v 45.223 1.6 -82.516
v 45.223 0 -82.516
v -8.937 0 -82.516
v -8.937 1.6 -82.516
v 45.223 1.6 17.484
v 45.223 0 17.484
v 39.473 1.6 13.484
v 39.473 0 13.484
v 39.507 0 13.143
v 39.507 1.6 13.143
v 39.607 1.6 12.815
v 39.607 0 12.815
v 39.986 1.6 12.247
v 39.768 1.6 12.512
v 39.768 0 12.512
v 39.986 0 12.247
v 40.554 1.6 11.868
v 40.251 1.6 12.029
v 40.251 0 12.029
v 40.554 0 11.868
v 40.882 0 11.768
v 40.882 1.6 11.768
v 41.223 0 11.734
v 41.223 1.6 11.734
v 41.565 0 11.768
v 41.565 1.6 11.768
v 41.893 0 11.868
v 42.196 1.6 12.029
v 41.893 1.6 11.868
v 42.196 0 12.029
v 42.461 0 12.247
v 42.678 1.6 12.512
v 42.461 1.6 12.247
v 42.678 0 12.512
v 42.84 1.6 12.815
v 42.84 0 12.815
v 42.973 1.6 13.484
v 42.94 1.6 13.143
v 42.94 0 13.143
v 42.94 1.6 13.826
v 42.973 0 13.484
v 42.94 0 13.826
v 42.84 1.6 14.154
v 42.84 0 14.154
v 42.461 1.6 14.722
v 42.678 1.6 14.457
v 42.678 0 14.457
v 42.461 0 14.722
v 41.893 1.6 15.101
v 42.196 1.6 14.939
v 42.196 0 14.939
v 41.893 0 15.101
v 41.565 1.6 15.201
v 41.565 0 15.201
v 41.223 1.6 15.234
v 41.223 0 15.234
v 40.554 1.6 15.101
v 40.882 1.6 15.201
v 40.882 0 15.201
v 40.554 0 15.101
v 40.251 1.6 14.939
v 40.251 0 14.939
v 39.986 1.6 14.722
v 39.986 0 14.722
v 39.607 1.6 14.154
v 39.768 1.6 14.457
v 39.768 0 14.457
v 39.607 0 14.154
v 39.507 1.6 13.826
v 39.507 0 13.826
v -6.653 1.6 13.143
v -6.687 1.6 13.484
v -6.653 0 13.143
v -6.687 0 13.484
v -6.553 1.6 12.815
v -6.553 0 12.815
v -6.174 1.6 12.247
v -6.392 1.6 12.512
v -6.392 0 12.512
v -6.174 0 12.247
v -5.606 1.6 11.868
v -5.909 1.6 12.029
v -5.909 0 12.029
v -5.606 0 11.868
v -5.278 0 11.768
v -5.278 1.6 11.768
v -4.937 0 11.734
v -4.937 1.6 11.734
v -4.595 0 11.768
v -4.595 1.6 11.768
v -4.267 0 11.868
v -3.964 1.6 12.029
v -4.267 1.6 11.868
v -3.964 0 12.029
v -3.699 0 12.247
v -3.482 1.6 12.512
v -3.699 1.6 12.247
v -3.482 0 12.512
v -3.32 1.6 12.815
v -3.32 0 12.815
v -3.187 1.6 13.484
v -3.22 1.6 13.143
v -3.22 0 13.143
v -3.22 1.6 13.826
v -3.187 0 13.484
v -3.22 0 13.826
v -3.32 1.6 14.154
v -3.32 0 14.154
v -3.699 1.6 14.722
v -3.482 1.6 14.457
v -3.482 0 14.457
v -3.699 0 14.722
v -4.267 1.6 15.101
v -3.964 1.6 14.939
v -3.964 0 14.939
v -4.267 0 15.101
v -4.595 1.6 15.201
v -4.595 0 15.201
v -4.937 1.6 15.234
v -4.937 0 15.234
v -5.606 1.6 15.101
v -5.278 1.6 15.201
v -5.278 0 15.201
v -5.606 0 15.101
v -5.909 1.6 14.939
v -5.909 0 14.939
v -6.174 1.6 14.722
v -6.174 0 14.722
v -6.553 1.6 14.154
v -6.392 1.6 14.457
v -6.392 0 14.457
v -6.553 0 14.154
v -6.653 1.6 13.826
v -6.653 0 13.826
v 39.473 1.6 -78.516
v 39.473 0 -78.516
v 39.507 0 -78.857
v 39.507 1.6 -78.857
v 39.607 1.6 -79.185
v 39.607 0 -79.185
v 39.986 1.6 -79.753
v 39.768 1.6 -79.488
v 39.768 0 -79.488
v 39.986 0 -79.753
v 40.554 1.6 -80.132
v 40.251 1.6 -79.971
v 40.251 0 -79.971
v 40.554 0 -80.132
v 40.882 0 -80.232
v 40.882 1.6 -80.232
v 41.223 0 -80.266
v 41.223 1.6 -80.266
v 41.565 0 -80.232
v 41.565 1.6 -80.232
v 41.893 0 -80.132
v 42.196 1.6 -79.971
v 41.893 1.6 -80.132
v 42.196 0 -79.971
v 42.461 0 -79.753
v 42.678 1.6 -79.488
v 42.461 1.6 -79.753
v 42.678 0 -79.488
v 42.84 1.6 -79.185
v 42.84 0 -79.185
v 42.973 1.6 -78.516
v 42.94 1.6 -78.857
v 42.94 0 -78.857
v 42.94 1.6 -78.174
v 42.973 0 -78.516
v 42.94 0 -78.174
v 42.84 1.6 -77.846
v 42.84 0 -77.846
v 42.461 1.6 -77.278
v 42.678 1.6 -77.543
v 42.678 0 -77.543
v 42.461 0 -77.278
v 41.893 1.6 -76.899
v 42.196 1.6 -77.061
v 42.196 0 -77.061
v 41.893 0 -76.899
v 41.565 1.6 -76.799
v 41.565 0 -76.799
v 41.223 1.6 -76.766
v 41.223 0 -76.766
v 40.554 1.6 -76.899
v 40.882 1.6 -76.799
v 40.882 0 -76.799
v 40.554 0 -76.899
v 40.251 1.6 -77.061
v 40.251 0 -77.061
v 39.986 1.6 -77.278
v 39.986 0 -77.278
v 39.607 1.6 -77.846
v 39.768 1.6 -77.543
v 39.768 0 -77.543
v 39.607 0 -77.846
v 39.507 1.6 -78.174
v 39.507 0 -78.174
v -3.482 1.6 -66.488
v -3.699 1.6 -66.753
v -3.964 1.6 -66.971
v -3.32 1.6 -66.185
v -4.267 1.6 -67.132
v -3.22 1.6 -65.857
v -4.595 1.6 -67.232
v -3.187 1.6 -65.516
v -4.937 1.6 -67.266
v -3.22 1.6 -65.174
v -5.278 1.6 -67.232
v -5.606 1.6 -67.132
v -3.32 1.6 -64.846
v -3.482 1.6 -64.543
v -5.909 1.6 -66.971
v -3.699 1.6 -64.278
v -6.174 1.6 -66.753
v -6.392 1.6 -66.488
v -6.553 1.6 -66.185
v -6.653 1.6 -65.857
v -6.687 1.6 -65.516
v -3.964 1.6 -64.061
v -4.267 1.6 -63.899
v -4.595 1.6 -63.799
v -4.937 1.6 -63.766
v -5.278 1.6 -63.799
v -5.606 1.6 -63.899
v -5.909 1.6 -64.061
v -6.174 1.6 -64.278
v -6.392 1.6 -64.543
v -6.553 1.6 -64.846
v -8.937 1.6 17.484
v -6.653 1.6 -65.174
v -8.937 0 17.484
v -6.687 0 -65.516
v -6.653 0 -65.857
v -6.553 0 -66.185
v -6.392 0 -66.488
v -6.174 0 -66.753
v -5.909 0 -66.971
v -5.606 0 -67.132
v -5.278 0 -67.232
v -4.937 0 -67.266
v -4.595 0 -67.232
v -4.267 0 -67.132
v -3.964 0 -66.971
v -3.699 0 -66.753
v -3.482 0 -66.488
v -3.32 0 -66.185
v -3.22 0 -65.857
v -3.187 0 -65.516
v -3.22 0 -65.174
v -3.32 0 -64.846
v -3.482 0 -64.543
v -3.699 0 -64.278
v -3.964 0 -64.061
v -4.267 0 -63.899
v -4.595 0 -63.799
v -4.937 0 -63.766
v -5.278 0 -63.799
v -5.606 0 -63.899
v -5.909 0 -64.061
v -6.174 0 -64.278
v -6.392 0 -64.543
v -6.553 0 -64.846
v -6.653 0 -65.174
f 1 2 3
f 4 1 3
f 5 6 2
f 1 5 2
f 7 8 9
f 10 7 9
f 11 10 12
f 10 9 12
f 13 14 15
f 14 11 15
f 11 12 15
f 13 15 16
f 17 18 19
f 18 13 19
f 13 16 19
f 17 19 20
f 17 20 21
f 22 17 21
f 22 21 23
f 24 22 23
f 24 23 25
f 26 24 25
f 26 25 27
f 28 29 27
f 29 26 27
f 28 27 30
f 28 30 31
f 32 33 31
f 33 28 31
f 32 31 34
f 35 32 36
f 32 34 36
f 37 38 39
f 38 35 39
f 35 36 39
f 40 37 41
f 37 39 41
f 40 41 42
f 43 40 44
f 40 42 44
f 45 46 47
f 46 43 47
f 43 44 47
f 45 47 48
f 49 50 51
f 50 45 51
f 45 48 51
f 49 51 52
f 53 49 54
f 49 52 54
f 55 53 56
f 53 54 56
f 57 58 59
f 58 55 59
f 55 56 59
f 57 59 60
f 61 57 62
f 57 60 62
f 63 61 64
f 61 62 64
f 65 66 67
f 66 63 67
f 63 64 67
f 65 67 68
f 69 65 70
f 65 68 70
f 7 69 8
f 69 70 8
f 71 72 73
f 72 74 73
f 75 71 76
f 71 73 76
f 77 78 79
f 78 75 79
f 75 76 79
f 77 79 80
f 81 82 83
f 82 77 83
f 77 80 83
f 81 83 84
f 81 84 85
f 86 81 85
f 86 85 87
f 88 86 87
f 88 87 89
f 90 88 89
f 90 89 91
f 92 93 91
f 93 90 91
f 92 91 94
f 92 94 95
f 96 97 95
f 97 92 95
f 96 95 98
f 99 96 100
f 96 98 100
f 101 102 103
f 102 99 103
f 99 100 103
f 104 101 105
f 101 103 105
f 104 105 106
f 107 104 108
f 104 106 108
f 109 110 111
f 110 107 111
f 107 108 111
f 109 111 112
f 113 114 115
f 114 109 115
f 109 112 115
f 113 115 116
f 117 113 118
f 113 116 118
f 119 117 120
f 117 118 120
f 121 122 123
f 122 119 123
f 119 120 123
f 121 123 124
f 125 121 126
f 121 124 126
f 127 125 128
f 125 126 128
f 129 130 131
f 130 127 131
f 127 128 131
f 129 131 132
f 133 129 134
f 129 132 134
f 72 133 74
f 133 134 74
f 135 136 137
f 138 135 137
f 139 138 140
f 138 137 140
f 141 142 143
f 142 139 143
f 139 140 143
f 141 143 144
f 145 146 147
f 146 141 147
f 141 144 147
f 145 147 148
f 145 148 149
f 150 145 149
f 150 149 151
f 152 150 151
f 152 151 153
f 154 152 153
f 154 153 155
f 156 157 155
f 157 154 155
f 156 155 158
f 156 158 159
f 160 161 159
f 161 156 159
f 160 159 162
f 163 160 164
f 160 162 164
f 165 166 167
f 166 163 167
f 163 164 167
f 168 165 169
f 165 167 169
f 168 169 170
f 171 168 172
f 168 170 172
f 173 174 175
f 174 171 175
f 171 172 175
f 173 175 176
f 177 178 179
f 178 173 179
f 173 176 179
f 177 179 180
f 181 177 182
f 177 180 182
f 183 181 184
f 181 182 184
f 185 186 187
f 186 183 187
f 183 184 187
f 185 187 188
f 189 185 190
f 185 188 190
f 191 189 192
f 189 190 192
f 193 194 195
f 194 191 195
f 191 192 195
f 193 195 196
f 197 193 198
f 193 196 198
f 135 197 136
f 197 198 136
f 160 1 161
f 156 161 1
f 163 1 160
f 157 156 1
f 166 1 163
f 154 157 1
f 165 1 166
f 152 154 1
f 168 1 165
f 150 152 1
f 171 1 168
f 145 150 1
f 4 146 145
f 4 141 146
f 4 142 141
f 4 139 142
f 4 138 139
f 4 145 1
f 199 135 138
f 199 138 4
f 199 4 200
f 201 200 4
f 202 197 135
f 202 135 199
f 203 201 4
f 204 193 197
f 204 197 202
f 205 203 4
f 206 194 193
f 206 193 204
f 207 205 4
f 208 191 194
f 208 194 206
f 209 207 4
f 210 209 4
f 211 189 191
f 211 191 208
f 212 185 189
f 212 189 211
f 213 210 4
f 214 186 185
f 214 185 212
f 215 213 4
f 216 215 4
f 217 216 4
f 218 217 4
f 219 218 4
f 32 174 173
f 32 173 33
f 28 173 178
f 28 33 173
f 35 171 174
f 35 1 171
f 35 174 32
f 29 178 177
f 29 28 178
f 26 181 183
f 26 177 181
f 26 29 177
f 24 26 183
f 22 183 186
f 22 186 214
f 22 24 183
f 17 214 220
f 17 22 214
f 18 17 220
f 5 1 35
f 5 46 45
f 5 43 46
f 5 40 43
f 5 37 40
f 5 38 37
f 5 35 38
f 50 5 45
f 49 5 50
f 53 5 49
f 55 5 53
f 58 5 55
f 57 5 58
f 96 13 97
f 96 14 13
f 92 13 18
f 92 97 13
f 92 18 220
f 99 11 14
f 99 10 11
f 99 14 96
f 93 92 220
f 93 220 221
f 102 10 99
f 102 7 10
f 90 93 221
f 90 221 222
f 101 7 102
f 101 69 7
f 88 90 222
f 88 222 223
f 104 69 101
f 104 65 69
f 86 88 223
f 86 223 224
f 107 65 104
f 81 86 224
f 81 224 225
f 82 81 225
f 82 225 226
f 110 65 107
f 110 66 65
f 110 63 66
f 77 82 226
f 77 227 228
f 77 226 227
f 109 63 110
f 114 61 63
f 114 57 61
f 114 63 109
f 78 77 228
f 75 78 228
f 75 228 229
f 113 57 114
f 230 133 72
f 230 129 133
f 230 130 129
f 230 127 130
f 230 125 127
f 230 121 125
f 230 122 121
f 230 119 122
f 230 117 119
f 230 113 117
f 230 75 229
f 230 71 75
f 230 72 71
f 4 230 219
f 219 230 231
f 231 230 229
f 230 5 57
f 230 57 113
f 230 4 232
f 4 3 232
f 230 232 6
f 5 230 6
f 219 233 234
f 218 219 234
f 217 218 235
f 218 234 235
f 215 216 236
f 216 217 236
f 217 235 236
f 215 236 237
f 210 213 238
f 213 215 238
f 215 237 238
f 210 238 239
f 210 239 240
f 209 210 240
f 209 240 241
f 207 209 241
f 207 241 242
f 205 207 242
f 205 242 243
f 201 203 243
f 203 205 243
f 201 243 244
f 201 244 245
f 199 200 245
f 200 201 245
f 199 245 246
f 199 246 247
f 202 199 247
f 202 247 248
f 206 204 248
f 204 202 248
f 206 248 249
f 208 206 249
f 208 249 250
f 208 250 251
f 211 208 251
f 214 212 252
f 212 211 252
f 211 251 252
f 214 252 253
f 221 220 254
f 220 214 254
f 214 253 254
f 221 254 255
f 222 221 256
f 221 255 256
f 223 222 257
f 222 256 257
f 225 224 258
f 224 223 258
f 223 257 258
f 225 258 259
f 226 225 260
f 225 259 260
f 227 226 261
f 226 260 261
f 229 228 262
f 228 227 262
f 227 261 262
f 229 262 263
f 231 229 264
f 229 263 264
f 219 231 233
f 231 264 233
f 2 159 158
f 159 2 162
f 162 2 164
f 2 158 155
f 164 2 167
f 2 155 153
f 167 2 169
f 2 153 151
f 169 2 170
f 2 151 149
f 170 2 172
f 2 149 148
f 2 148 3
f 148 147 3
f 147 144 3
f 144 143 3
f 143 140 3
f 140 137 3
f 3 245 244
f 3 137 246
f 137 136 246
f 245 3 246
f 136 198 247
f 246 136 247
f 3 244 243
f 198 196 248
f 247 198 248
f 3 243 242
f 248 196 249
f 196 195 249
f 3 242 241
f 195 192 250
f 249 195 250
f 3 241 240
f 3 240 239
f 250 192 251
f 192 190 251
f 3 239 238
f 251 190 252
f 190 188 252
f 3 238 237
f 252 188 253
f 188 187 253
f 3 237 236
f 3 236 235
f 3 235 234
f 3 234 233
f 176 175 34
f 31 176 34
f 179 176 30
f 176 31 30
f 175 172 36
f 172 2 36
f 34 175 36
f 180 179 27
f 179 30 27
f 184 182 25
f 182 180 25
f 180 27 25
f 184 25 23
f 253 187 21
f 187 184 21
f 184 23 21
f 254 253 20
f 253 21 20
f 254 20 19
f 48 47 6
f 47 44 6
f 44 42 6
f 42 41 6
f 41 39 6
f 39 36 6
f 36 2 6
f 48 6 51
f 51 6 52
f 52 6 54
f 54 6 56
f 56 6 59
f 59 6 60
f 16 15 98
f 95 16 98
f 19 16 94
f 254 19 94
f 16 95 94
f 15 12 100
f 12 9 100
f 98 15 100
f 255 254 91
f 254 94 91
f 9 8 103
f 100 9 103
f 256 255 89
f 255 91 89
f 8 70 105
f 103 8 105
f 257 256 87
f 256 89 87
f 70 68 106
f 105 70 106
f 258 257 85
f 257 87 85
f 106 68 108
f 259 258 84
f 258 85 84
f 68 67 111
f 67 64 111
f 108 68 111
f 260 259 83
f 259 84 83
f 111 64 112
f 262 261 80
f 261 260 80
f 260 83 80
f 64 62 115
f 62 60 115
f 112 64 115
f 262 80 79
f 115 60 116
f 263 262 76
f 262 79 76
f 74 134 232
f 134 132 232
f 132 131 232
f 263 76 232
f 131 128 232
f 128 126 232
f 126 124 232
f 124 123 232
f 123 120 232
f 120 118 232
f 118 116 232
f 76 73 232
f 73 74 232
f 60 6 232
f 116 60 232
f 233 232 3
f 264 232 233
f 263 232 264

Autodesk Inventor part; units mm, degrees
ref_plane "YZ Plane" through (0, 0, 0) normal (1, 0, 0) x (0, 1, 0)
ref_plane "XZ Plane" through (0, 0, 0) normal (0, 1, 0) x (-1, 0, 0)
ref_plane "XY Plane" through (0, 0, 0) normal (0, 0, 1) x (1, 0, 0)
sketch "Sketch1" plane through (0, 0, 0) normal (0, 1, 0) x (-1, 0, 0)
  circle A0 centre (4.9367, 13.4843) radius 1.75
  line L0 (19.7687, 0) -> (-56.0553, 0) projected
  line L1 (0, -102.5157) -> (0, 37.4843) projected
  circle A1 centre (-41.2233, 13.4843) radius 1.75
  circle A2 centre (-41.2233, -78.5157) radius 1.75
  circle A3 centre (4.9367, -65.5157) radius 1.75
  line L2 (8.9367, 17.4843) -> (-45.2233, 17.4843)
  line L3 (-45.2233, 17.4843) -> (-45.2233, -82.5157)
  line L4 (-45.2233, -82.5157) -> (8.9367, -82.5157)
  line L5 (8.9367, -82.5157) -> (8.9367, 17.4843)
  point P0 (0, 0)
  dimension "d0" = 3.5
  dimension "d3" = 46.16
  dimension "d10" = 92
  dimension "d17" = 79
  dimension "d22" = 4
  dimension "d23" = 4
  dimension "d24" = 4
  dimension "d25" = 4
  dimension "d26" = 4
extrude "Extrusion1" add sketch "Sketch1" along normal blind 1.6
properties part number "PCB"
